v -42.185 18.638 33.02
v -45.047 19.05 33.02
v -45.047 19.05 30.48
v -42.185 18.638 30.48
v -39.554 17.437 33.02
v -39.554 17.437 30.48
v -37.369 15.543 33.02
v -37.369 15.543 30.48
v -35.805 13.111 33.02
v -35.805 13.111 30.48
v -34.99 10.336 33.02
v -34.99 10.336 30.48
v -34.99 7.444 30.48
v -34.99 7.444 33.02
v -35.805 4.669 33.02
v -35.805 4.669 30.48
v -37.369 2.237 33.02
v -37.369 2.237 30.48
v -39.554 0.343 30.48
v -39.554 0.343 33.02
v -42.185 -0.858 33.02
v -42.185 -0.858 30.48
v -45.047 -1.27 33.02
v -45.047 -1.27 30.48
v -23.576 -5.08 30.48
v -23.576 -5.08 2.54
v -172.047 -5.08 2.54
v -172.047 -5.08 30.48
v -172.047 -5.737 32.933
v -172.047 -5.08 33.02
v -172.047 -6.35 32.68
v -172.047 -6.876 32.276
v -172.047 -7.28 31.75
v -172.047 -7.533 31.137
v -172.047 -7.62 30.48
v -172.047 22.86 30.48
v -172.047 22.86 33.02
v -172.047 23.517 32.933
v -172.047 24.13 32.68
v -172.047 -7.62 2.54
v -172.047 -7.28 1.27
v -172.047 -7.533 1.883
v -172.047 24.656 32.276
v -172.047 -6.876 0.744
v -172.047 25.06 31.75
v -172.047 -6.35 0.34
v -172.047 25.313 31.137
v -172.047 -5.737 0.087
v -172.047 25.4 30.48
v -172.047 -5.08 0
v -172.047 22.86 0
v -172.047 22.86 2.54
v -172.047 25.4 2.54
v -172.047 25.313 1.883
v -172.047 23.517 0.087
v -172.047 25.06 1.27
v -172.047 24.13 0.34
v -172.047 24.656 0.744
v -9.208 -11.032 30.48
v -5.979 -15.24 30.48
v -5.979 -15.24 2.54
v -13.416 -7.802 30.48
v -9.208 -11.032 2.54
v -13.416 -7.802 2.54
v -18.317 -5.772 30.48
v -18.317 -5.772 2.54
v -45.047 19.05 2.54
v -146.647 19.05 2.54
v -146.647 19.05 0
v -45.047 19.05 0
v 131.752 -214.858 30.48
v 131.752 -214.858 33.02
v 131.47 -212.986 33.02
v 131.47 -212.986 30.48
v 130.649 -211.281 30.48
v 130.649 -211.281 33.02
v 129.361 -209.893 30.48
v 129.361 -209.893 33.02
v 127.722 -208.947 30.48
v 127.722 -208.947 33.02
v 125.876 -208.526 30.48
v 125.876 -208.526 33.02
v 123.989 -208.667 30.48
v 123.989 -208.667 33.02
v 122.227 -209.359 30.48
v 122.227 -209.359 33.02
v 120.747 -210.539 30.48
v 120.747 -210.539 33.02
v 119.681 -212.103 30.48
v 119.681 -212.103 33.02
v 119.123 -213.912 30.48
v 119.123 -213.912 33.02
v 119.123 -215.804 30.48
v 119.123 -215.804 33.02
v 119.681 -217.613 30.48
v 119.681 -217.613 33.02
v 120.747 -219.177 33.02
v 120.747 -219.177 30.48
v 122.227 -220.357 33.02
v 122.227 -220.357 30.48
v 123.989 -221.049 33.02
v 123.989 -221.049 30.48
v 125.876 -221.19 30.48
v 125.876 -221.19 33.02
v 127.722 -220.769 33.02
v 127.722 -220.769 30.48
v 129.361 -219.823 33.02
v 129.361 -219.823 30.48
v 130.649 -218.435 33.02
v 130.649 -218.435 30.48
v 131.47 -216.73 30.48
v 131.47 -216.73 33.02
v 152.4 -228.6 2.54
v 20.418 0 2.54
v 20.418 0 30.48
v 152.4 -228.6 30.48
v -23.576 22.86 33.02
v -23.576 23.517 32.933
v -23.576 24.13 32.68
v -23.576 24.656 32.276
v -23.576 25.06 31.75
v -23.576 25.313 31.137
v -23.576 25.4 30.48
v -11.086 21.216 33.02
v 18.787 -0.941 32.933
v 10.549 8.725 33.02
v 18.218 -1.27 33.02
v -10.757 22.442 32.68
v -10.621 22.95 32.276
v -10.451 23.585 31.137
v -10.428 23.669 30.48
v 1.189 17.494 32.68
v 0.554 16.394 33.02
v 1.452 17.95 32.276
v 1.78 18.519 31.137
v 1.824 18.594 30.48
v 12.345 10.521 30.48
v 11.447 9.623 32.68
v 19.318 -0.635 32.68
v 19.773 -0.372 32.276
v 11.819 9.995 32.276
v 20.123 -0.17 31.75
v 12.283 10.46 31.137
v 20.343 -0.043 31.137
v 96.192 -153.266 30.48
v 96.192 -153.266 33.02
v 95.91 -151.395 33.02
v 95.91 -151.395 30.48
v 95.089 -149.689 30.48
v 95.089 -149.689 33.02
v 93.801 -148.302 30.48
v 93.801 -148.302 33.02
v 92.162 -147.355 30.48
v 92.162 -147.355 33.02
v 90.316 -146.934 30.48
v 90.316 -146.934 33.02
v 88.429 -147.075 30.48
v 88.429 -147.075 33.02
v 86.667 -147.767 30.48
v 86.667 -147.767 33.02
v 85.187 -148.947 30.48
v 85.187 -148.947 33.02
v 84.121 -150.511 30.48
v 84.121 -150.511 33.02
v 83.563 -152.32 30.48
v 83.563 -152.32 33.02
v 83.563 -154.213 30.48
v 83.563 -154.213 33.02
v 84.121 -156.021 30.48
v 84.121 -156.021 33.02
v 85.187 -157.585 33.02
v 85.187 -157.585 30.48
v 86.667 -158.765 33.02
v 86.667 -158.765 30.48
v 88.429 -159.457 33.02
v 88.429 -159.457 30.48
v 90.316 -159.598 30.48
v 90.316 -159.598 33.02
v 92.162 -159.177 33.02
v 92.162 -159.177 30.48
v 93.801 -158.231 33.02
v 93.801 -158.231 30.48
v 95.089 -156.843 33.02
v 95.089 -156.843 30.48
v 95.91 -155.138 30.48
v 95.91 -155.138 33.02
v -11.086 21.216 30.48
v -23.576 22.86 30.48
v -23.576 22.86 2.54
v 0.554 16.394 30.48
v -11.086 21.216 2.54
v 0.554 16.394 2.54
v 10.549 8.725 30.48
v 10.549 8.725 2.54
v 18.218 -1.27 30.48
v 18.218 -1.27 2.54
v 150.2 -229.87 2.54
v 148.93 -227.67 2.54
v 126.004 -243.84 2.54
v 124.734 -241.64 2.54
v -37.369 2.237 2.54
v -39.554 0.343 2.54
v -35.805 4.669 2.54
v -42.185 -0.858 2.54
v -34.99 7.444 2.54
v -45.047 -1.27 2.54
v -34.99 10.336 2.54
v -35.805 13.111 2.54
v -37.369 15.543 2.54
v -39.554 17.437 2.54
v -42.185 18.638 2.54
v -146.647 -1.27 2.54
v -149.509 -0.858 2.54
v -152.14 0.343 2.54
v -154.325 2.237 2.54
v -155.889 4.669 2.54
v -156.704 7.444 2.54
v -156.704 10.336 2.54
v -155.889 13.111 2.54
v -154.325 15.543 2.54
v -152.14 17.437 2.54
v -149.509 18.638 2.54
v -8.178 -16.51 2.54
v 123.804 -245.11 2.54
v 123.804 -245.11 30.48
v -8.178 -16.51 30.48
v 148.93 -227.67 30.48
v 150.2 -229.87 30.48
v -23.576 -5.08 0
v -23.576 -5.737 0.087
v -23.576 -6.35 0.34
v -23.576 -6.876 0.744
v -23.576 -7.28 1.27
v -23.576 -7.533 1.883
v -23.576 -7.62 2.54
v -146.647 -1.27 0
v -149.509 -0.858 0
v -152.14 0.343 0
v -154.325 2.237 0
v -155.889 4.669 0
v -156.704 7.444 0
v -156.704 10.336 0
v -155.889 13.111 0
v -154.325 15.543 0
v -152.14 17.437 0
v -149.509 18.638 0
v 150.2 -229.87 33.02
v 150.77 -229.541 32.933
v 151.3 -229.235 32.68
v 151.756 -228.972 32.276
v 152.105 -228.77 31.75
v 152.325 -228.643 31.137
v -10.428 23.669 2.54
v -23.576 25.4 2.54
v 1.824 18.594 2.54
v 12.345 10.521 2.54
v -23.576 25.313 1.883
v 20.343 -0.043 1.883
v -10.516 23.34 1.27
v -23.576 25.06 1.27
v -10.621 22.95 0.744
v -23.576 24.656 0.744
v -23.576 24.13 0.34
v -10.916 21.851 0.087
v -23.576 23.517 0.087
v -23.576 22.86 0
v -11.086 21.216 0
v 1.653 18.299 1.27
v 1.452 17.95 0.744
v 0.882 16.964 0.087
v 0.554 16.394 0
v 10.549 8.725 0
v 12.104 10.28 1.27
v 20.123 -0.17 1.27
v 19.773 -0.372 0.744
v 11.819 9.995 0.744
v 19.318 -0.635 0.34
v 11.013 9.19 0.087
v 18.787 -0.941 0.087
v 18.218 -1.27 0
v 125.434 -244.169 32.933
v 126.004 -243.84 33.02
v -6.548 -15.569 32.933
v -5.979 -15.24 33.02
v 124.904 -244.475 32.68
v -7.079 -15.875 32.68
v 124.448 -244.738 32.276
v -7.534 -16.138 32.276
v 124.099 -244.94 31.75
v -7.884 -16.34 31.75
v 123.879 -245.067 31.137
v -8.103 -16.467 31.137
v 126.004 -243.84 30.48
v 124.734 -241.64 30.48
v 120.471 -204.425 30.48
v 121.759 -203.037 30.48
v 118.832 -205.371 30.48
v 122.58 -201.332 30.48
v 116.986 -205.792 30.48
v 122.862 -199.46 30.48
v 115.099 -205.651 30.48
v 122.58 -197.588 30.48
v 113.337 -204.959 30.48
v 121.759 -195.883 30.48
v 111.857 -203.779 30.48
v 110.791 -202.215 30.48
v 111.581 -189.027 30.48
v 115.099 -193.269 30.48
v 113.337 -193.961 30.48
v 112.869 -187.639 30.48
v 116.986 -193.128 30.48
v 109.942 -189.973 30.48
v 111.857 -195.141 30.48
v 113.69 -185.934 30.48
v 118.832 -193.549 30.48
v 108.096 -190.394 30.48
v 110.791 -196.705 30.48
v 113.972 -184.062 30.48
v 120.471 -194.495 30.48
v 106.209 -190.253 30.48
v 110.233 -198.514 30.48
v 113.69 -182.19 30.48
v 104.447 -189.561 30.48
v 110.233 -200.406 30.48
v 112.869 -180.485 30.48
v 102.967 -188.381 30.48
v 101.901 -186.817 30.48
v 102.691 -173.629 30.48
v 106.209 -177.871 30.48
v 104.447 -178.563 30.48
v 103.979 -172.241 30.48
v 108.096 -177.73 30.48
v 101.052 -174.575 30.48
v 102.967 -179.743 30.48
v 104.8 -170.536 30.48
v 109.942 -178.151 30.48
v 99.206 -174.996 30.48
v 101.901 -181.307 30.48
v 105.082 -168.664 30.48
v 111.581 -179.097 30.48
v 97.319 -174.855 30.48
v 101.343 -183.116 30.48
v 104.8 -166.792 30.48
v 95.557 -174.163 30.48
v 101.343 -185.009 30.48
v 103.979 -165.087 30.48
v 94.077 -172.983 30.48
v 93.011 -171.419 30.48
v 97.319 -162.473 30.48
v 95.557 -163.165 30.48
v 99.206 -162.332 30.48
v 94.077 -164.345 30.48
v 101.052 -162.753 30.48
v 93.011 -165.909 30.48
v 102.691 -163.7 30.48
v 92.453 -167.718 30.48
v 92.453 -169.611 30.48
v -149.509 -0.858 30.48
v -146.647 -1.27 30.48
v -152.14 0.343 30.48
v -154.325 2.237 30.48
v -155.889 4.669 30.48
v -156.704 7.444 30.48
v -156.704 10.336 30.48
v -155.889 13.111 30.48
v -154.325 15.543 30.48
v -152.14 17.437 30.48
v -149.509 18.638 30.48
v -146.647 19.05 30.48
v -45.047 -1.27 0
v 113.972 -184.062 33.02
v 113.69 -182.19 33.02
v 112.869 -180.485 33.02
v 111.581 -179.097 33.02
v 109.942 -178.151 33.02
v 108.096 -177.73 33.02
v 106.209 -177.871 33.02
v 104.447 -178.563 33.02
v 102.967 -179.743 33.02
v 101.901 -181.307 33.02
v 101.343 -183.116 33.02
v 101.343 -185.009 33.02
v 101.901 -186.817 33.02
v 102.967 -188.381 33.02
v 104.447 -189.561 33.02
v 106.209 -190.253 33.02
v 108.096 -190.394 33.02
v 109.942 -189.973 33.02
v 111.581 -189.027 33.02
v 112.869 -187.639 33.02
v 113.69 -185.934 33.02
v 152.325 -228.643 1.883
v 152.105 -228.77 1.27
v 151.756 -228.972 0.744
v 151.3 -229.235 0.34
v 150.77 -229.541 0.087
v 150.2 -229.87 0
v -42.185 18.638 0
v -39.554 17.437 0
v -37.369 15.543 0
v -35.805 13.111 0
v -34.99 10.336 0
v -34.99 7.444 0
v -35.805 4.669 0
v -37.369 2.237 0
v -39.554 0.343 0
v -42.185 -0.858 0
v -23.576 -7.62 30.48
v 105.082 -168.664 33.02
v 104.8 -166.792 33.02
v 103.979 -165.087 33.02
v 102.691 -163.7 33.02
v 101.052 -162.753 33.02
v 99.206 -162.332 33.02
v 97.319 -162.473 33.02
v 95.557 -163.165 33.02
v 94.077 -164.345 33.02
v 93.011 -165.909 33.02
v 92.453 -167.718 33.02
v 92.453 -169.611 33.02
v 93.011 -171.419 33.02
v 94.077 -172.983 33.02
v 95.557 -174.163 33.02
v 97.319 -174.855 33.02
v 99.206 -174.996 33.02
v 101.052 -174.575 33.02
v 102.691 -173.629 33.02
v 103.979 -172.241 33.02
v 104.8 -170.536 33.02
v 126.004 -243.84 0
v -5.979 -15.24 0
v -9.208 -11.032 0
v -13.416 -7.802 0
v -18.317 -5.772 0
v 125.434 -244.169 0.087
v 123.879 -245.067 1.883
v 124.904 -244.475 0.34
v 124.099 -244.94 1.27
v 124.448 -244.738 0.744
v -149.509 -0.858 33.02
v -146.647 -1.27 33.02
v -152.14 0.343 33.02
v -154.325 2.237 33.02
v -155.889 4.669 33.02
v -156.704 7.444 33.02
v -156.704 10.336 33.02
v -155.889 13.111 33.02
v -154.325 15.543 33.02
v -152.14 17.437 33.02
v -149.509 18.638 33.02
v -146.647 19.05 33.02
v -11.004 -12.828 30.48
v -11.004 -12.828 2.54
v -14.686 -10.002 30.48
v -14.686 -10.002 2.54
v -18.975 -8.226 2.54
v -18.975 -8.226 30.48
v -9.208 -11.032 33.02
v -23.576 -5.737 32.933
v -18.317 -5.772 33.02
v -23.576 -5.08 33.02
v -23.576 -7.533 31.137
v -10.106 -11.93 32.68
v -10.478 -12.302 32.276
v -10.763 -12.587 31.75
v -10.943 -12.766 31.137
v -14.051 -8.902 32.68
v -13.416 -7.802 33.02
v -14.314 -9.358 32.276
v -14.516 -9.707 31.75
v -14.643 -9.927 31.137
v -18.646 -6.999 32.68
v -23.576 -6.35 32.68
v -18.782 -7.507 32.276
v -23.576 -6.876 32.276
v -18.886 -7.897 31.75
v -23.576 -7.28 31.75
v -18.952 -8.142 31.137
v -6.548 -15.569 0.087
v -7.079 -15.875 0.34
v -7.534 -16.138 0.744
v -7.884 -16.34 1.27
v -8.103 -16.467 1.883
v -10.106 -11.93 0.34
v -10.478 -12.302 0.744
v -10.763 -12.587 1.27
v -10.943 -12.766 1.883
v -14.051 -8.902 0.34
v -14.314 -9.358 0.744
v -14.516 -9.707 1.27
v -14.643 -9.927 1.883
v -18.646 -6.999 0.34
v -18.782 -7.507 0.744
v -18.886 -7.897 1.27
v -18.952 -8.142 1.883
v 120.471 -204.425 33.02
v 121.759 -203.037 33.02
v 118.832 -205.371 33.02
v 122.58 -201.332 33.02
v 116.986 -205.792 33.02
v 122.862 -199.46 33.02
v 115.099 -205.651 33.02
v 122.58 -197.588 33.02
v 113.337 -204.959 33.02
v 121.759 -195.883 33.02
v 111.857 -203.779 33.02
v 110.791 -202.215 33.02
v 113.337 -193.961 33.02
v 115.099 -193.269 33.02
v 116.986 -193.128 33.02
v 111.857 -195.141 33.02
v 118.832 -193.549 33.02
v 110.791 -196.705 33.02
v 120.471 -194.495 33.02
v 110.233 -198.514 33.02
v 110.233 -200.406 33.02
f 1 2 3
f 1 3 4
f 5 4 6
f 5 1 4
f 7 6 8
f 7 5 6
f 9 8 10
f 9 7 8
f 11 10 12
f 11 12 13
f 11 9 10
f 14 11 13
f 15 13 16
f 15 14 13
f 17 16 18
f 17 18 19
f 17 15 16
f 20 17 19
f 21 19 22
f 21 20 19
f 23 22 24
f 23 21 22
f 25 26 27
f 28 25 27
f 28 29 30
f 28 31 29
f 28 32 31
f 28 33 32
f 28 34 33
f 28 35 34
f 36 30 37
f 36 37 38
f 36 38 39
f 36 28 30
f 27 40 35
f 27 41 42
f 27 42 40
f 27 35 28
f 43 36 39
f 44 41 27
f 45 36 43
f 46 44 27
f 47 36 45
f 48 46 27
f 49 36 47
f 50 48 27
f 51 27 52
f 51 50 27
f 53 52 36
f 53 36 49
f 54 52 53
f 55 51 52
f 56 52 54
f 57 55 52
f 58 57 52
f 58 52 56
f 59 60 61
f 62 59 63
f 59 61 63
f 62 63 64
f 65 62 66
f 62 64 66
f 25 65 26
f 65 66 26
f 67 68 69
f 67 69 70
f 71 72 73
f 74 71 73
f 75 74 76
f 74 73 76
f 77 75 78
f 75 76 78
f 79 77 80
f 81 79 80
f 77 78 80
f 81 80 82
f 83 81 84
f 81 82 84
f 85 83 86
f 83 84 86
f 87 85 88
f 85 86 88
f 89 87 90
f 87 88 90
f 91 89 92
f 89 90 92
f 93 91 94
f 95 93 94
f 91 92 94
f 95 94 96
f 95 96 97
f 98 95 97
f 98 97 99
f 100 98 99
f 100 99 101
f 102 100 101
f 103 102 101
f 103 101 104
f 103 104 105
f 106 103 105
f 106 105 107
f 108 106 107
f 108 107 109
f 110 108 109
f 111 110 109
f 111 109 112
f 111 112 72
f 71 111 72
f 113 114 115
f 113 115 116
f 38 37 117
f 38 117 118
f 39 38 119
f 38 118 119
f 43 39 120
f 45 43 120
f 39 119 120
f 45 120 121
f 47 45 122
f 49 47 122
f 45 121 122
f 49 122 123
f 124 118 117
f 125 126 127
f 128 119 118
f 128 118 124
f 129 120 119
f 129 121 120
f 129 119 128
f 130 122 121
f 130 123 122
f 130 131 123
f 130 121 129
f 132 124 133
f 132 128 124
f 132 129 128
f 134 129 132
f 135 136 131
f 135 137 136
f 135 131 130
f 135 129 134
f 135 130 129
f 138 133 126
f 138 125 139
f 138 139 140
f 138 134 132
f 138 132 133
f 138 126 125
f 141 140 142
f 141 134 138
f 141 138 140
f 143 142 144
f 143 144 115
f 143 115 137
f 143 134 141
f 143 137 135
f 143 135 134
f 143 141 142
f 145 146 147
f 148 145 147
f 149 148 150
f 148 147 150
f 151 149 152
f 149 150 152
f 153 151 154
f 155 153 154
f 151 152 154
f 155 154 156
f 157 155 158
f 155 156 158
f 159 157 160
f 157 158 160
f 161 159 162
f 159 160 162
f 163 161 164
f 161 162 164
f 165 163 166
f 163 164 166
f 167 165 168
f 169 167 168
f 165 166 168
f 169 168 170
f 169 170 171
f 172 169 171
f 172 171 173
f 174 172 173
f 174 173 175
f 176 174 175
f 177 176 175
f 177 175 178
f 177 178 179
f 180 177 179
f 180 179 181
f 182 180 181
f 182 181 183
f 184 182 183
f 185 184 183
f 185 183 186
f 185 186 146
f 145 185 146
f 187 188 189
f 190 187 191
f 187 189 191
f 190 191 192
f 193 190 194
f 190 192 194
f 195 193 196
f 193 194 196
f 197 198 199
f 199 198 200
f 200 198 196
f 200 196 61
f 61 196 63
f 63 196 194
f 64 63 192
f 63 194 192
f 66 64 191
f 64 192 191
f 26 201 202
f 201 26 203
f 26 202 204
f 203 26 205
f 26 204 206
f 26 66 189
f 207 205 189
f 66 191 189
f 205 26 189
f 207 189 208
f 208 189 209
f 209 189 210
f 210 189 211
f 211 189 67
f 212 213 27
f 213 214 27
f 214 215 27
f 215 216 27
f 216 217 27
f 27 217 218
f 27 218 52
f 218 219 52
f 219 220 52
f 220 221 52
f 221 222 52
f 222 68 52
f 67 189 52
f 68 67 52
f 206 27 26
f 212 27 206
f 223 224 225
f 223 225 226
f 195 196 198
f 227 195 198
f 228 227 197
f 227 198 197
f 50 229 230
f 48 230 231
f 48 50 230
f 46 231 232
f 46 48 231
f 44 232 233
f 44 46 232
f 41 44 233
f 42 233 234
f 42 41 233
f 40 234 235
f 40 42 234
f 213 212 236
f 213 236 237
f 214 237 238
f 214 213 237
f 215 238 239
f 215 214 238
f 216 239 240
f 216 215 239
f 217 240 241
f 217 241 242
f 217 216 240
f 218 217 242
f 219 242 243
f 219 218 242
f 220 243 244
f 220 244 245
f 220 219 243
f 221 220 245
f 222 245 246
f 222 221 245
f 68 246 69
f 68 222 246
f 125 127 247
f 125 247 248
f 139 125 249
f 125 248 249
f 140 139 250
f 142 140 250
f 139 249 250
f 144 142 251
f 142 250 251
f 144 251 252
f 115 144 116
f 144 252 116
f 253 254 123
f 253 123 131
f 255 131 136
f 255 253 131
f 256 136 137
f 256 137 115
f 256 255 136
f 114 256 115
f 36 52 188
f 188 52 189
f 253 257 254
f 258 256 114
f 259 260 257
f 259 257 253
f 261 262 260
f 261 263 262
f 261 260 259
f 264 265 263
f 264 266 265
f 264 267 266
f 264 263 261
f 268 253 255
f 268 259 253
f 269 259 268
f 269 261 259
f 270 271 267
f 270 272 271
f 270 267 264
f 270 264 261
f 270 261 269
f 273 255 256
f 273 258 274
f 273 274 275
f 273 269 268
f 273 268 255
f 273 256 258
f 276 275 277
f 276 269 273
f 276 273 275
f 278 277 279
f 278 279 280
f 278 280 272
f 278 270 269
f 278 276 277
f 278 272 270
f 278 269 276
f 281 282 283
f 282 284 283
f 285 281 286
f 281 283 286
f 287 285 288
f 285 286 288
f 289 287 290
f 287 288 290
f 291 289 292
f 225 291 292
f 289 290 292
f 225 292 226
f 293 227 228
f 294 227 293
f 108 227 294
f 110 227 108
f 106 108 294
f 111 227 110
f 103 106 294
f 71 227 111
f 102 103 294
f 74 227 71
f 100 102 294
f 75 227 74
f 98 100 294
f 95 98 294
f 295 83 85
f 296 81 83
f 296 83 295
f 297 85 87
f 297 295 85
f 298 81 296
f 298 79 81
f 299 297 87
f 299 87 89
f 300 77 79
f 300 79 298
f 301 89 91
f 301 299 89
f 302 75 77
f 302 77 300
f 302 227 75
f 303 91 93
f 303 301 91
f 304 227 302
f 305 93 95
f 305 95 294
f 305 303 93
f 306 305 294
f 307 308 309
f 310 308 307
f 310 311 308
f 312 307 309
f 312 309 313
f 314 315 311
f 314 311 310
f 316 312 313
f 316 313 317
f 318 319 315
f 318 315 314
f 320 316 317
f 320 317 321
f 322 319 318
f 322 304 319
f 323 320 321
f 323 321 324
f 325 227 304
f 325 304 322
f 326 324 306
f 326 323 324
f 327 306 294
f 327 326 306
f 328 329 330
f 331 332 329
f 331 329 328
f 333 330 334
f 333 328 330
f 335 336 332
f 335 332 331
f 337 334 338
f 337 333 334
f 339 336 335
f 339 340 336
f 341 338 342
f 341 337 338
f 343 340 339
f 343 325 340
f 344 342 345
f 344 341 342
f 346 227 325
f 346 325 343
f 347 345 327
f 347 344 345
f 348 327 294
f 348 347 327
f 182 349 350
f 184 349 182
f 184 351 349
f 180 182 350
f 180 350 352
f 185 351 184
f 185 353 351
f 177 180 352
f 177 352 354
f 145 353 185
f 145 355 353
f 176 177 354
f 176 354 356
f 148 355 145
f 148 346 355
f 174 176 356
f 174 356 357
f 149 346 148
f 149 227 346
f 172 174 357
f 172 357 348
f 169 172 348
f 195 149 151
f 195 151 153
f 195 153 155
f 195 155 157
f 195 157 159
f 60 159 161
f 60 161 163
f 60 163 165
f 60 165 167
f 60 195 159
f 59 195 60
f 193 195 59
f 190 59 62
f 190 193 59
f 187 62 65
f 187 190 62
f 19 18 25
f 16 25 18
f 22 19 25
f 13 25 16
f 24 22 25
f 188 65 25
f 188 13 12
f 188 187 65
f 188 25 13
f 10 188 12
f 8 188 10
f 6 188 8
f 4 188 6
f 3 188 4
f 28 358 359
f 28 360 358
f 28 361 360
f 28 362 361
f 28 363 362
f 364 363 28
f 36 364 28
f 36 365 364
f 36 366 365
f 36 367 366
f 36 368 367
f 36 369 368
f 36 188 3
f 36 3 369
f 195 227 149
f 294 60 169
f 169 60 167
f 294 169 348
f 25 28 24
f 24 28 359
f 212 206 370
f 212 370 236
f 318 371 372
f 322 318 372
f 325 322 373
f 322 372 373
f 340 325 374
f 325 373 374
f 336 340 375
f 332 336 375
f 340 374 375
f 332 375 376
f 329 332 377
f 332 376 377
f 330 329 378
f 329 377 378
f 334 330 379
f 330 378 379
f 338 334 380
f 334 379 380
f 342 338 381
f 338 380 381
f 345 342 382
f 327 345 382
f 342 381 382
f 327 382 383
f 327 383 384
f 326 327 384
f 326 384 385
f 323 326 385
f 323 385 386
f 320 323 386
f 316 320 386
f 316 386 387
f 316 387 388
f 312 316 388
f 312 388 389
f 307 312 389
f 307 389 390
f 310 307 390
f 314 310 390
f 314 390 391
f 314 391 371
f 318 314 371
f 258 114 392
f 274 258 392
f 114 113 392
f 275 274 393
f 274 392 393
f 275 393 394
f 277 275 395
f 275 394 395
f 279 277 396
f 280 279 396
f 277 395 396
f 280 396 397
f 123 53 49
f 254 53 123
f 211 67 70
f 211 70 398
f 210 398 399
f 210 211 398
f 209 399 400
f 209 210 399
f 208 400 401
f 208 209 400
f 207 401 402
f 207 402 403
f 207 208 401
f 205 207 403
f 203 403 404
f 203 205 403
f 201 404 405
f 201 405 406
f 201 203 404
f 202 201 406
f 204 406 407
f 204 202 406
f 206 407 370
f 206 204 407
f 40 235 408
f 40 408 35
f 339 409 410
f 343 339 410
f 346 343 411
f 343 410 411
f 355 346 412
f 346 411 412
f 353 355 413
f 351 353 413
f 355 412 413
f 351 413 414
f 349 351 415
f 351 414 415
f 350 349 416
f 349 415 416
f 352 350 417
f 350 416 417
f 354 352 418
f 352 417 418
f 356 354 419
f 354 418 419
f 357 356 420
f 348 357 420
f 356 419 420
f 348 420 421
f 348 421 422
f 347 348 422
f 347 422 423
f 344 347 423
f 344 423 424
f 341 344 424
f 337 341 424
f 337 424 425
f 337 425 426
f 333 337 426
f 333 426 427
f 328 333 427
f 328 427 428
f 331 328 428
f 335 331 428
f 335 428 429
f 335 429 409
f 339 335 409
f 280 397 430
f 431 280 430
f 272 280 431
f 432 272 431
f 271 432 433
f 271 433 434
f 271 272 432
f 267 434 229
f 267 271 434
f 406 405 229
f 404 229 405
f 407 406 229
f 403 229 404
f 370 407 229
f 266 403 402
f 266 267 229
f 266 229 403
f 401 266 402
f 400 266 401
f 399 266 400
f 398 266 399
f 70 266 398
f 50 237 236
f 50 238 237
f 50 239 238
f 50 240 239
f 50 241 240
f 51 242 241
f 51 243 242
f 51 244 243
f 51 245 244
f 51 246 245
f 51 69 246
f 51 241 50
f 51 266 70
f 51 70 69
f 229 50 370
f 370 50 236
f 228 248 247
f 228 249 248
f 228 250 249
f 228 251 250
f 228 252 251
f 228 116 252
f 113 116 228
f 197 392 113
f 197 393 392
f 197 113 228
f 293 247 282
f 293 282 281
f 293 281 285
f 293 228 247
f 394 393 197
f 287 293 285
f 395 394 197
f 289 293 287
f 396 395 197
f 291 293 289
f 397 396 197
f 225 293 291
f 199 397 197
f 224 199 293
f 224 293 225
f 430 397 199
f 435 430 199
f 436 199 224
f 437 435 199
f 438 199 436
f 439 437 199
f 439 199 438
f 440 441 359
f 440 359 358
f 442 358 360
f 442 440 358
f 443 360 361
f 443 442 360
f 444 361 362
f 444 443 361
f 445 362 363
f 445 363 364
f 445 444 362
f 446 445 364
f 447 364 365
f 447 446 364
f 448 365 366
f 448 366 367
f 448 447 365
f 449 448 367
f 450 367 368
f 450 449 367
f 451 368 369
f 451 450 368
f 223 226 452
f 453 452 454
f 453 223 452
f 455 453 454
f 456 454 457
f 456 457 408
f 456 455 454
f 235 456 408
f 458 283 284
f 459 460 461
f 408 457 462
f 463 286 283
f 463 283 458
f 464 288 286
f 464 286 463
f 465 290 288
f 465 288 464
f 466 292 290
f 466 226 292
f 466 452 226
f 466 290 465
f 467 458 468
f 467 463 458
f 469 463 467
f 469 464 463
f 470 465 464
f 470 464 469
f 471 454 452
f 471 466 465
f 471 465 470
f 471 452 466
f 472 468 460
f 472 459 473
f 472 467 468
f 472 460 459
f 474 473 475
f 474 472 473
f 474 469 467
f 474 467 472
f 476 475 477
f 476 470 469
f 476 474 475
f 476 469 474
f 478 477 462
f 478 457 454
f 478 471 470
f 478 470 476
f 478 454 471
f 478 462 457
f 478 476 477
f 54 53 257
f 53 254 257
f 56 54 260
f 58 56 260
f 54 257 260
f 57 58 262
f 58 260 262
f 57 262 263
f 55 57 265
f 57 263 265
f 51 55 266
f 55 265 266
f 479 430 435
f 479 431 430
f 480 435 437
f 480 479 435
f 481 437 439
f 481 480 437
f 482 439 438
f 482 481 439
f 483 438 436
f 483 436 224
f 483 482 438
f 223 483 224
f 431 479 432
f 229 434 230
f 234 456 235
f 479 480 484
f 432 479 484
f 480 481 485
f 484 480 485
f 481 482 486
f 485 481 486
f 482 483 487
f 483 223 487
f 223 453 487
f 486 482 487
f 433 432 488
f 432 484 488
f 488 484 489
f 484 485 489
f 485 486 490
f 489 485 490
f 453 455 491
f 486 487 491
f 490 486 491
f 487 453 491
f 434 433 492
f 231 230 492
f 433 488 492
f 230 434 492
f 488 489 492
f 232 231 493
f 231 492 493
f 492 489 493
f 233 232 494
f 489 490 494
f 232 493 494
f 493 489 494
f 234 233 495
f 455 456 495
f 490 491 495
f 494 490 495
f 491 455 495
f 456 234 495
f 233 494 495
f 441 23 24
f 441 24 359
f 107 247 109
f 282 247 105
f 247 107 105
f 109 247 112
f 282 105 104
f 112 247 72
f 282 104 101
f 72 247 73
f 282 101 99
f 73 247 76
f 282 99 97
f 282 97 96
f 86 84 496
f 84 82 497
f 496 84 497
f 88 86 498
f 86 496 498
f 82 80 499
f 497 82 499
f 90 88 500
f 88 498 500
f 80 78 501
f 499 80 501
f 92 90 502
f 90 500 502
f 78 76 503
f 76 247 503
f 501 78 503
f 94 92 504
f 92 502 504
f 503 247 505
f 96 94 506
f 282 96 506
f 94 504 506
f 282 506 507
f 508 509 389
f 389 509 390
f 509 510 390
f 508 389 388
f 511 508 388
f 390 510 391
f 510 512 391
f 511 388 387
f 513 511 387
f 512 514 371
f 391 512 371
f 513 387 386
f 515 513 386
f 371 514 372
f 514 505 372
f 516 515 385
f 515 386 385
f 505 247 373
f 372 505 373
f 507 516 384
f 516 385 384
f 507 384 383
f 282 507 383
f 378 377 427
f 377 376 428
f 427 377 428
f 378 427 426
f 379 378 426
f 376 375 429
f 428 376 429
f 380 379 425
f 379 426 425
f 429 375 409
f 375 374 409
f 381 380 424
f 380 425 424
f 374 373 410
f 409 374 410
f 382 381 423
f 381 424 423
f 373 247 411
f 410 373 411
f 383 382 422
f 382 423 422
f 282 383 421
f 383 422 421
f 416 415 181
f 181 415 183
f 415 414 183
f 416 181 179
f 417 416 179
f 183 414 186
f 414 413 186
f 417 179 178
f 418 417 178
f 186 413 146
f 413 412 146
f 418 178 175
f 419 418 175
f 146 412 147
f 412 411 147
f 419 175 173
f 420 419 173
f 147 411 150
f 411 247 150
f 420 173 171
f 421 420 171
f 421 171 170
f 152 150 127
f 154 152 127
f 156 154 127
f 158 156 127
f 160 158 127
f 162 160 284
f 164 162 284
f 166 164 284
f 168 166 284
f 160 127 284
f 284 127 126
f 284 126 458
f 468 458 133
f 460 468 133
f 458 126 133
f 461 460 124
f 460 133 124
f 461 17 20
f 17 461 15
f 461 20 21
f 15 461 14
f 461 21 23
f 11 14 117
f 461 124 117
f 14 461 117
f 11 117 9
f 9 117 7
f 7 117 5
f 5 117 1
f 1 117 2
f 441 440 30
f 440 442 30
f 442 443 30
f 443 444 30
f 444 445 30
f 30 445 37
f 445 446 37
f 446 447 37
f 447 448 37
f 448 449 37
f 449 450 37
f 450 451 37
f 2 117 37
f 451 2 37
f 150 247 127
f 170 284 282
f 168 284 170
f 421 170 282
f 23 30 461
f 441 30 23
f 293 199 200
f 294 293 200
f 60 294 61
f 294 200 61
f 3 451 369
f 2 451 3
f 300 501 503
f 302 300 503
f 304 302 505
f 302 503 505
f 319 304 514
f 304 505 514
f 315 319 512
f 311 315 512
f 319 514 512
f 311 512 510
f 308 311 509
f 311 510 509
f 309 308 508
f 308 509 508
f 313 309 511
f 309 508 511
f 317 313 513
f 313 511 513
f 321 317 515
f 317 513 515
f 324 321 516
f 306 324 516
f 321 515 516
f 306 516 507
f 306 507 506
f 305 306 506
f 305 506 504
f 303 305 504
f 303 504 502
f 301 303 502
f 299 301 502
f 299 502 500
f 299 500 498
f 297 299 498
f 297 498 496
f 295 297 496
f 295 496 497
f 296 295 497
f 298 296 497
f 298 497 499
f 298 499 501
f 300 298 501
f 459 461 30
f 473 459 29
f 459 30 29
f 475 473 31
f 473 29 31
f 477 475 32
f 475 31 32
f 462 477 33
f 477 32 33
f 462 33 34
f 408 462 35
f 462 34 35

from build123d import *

# Parameters (mm, degrees)
BOSS_EXTRUDE1_DEPTH = 33.02
SHELL1_T            = -2.54
CUT_EXTRUDE1_REACH  = 409.111
SKETCH2_W           = 27.94
SKETCH2_H           = 27.94
CUT_EXTRUDE2_DEPTH  = 2.54
CUT_EXTRUDE3_START  = -2.54
CUT_EXTRUDE3_DEPTH  = 2.54
CUT_EXTRUDE4_REACH  = 303.28
SKETCH5_R           = 6.35
FILLET1_R           = 2.54


with BuildPart() as part:
    # Sketch1 → Boss-Extrude1 (new body)
    with BuildSketch(Plane.XY):
        with BuildLine():
            Line((-172.046968374, 25.4), (-23.576362049, 25.4))
            ThreePointArc((-23.576362049, 25.4), (1.823637951, 18.594090512), (20.417728463, 0))
            Line((20.417728463, 0), (152.4, -228.6))
            Line((152.4, -228.6), (123.803841167, -245.11))
            Line((123.803841167, -245.11), (-8.17843037, -16.51))
            ThreePointArc((-8.17843037, -16.51), (-14.686362049, -10.002068321), (-23.576362049, -7.62))
            Line((-23.576362049, -7.62), (-172.046968374, -7.62))
            Line((-172.046968374, -7.62), (-172.046968374, 25.4))
        make_face()
    extrude(amount=BOSS_EXTRUDE1_DEPTH)

    # Shell1
    shell1_openings = [part.faces().sort_by_distance(p)[0] for p in [
        (-172.046968374, 8.89, 16.51),
    ]]
    offset(amount=SHELL1_T, openings=shell1_openings, kind=Kind.INTERSECTION)

    # Sketch2 → Cut-Extrude1 (cut, up to next)
    with BuildSketch(Plane(origin=(137.086703653, -237.441135768, 0), x_dir=(0.8660254037844406, 0.4999999999999967, 0), z_dir=(0.4999999999999967, -0.8660254037844406, 0)), mode=Mode.PRIVATE) as cut_extrude1_sk1:
        with Locations((1.172271537, 16.51)):
            Rectangle(SKETCH2_W, SKETCH2_H)
    cut_extrude1_tool1 = extrude(cut_extrude1_sk1.sketch, amount=-CUT_EXTRUDE1_REACH, mode=Mode.PRIVATE) & part.part
    add(cut_extrude1_tool1.solids().sort_by_distance((138.101921, -236.855, 16.51))[0], mode=Mode.SUBTRACT)

    # Sketch3 → Cut-Extrude2 (cut)
    with BuildSketch(Plane.XY.offset(33.02)):
        with BuildLine():
            Line((-146.646968374, 19.05), (-45.046968374, 19.05))
            ThreePointArc((-45.046968374, 19.05), (-34.886968374, 8.89), (-45.046968374, -1.27))
            Line((-45.046968374, -1.27), (-50.126968374, -1.27))
            Line((-50.126968374, -1.27), (-146.646968374, -1.27))
            ThreePointArc((-146.646968374, -1.27), (-156.806968374, 8.89), (-146.646968374, 19.05))
        make_face()
    extrude(amount=-CUT_EXTRUDE2_DEPTH, mode=Mode.SUBTRACT)

    # Sketch4 → Cut-Extrude3 (cut)
    with BuildSketch(Plane(origin=(0, 0, 0), x_dir=(-1, 0, 0), z_dir=(0, 0, -1)).offset(CUT_EXTRUDE3_START)):
        with BuildLine():
            Line((141.566968374, -1.27), (146.646968374, -1.27))
            ThreePointArc((146.646968374, -1.27), (156.806968374, 8.89), (146.646968374, 19.05))
            Line((146.646968374, 19.05), (45.046968374, 19.05))
            ThreePointArc((45.046968374, 19.05), (34.886968374, 8.89), (45.046968374, -1.27))
            Line((45.046968374, -1.27), (141.566968374, -1.27))
        make_face()
    extrude(amount=CUT_EXTRUDE3_DEPTH, mode=Mode.SUBTRACT)

    # Sketch5 → Cut-Extrude4 (cut, up to next)
    with BuildSketch(Plane.XY.offset(33.02), mode=Mode.PRIVATE) as cut_extrude4_sk1:
        with Locations((125.401920584, -214.857954744)):
            Circle(SKETCH5_R)
    cut_extrude4_tool1 = extrude(cut_extrude4_sk1.sketch, amount=-CUT_EXTRUDE4_REACH, mode=Mode.PRIVATE) & part.part
    # Sketch5 → Cut-Extrude4 (cut, up to next)
    with BuildSketch(Plane.XY.offset(33.02), mode=Mode.PRIVATE) as cut_extrude4_sk2:
        with Locations((116.511920584, -199.460023065)):
            Circle(SKETCH5_R)
    cut_extrude4_tool2 = extrude(cut_extrude4_sk2.sketch, amount=-CUT_EXTRUDE4_REACH, mode=Mode.PRIVATE) & part.part
    # Sketch5 → Cut-Extrude4 (cut, up to next)
    with BuildSketch(Plane.XY.offset(33.02), mode=Mode.PRIVATE) as cut_extrude4_sk3:
        with Locations((107.621920584, -184.062091385)):
            Circle(SKETCH5_R)
    cut_extrude4_tool3 = extrude(cut_extrude4_sk3.sketch, amount=-CUT_EXTRUDE4_REACH, mode=Mode.PRIVATE) & part.part
    # Sketch5 → Cut-Extrude4 (cut, up to next)
    with BuildSketch(Plane.XY.offset(33.02), mode=Mode.PRIVATE) as cut_extrude4_sk4:
        with Locations((98.731920584, -168.664159706)):
            Circle(SKETCH5_R)
    cut_extrude4_tool4 = extrude(cut_extrude4_sk4.sketch, amount=-CUT_EXTRUDE4_REACH, mode=Mode.PRIVATE) & part.part
    # Sketch5 → Cut-Extrude4 (cut, up to next)
    with BuildSketch(Plane.XY.offset(33.02), mode=Mode.PRIVATE) as cut_extrude4_sk5:
        with Locations((89.841920584, -153.266228027)):
            Circle(SKETCH5_R)
    cut_extrude4_tool5 = extrude(cut_extrude4_sk5.sketch, amount=-CUT_EXTRUDE4_REACH, mode=Mode.PRIVATE) & part.part
    add(cut_extrude4_tool1.solids().sort_by_distance((125.401921, -214.857955, 33.02))[0], mode=Mode.SUBTRACT)
    add(cut_extrude4_tool2.solids().sort_by_distance((116.511921, -199.460023, 33.02))[0], mode=Mode.SUBTRACT)
    add(cut_extrude4_tool3.solids().sort_by_distance((107.621921, -184.062091, 33.02))[0], mode=Mode.SUBTRACT)
    add(cut_extrude4_tool4.solids().sort_by_distance((98.731921, -168.66416, 33.02))[0], mode=Mode.SUBTRACT)
    add(cut_extrude4_tool5.solids().sort_by_distance((89.841921, -153.266228, 33.02))[0], mode=Mode.SUBTRACT)

    # Fillet1
    fillet1_edges = [part.edges().sort_by_distance(p)[0] for p in [
        (57.812705399, -130.81, 0),
        (-14.686362049, -10.002068321, 0),
        (-97.811665212, -7.62, 0),
        (-14.686362049, -10.002068321, 33.02),
        (57.812705399, -130.81, 33.02),
        (86.408864232, -114.3, 33.02),
        (1.823637951, 18.594090512, 33.02),
        (-97.811665212, 25.4, 33.02),
        (-97.811665212, 25.4, 0),
        (-97.811665212, -7.62, 33.02),
        (1.823637951, 18.594090512, 0),
        (86.408864232, -114.3, 0),
    ]]
    fillet(fillet1_edges, radius=FILLET1_R)


solid = part.part
